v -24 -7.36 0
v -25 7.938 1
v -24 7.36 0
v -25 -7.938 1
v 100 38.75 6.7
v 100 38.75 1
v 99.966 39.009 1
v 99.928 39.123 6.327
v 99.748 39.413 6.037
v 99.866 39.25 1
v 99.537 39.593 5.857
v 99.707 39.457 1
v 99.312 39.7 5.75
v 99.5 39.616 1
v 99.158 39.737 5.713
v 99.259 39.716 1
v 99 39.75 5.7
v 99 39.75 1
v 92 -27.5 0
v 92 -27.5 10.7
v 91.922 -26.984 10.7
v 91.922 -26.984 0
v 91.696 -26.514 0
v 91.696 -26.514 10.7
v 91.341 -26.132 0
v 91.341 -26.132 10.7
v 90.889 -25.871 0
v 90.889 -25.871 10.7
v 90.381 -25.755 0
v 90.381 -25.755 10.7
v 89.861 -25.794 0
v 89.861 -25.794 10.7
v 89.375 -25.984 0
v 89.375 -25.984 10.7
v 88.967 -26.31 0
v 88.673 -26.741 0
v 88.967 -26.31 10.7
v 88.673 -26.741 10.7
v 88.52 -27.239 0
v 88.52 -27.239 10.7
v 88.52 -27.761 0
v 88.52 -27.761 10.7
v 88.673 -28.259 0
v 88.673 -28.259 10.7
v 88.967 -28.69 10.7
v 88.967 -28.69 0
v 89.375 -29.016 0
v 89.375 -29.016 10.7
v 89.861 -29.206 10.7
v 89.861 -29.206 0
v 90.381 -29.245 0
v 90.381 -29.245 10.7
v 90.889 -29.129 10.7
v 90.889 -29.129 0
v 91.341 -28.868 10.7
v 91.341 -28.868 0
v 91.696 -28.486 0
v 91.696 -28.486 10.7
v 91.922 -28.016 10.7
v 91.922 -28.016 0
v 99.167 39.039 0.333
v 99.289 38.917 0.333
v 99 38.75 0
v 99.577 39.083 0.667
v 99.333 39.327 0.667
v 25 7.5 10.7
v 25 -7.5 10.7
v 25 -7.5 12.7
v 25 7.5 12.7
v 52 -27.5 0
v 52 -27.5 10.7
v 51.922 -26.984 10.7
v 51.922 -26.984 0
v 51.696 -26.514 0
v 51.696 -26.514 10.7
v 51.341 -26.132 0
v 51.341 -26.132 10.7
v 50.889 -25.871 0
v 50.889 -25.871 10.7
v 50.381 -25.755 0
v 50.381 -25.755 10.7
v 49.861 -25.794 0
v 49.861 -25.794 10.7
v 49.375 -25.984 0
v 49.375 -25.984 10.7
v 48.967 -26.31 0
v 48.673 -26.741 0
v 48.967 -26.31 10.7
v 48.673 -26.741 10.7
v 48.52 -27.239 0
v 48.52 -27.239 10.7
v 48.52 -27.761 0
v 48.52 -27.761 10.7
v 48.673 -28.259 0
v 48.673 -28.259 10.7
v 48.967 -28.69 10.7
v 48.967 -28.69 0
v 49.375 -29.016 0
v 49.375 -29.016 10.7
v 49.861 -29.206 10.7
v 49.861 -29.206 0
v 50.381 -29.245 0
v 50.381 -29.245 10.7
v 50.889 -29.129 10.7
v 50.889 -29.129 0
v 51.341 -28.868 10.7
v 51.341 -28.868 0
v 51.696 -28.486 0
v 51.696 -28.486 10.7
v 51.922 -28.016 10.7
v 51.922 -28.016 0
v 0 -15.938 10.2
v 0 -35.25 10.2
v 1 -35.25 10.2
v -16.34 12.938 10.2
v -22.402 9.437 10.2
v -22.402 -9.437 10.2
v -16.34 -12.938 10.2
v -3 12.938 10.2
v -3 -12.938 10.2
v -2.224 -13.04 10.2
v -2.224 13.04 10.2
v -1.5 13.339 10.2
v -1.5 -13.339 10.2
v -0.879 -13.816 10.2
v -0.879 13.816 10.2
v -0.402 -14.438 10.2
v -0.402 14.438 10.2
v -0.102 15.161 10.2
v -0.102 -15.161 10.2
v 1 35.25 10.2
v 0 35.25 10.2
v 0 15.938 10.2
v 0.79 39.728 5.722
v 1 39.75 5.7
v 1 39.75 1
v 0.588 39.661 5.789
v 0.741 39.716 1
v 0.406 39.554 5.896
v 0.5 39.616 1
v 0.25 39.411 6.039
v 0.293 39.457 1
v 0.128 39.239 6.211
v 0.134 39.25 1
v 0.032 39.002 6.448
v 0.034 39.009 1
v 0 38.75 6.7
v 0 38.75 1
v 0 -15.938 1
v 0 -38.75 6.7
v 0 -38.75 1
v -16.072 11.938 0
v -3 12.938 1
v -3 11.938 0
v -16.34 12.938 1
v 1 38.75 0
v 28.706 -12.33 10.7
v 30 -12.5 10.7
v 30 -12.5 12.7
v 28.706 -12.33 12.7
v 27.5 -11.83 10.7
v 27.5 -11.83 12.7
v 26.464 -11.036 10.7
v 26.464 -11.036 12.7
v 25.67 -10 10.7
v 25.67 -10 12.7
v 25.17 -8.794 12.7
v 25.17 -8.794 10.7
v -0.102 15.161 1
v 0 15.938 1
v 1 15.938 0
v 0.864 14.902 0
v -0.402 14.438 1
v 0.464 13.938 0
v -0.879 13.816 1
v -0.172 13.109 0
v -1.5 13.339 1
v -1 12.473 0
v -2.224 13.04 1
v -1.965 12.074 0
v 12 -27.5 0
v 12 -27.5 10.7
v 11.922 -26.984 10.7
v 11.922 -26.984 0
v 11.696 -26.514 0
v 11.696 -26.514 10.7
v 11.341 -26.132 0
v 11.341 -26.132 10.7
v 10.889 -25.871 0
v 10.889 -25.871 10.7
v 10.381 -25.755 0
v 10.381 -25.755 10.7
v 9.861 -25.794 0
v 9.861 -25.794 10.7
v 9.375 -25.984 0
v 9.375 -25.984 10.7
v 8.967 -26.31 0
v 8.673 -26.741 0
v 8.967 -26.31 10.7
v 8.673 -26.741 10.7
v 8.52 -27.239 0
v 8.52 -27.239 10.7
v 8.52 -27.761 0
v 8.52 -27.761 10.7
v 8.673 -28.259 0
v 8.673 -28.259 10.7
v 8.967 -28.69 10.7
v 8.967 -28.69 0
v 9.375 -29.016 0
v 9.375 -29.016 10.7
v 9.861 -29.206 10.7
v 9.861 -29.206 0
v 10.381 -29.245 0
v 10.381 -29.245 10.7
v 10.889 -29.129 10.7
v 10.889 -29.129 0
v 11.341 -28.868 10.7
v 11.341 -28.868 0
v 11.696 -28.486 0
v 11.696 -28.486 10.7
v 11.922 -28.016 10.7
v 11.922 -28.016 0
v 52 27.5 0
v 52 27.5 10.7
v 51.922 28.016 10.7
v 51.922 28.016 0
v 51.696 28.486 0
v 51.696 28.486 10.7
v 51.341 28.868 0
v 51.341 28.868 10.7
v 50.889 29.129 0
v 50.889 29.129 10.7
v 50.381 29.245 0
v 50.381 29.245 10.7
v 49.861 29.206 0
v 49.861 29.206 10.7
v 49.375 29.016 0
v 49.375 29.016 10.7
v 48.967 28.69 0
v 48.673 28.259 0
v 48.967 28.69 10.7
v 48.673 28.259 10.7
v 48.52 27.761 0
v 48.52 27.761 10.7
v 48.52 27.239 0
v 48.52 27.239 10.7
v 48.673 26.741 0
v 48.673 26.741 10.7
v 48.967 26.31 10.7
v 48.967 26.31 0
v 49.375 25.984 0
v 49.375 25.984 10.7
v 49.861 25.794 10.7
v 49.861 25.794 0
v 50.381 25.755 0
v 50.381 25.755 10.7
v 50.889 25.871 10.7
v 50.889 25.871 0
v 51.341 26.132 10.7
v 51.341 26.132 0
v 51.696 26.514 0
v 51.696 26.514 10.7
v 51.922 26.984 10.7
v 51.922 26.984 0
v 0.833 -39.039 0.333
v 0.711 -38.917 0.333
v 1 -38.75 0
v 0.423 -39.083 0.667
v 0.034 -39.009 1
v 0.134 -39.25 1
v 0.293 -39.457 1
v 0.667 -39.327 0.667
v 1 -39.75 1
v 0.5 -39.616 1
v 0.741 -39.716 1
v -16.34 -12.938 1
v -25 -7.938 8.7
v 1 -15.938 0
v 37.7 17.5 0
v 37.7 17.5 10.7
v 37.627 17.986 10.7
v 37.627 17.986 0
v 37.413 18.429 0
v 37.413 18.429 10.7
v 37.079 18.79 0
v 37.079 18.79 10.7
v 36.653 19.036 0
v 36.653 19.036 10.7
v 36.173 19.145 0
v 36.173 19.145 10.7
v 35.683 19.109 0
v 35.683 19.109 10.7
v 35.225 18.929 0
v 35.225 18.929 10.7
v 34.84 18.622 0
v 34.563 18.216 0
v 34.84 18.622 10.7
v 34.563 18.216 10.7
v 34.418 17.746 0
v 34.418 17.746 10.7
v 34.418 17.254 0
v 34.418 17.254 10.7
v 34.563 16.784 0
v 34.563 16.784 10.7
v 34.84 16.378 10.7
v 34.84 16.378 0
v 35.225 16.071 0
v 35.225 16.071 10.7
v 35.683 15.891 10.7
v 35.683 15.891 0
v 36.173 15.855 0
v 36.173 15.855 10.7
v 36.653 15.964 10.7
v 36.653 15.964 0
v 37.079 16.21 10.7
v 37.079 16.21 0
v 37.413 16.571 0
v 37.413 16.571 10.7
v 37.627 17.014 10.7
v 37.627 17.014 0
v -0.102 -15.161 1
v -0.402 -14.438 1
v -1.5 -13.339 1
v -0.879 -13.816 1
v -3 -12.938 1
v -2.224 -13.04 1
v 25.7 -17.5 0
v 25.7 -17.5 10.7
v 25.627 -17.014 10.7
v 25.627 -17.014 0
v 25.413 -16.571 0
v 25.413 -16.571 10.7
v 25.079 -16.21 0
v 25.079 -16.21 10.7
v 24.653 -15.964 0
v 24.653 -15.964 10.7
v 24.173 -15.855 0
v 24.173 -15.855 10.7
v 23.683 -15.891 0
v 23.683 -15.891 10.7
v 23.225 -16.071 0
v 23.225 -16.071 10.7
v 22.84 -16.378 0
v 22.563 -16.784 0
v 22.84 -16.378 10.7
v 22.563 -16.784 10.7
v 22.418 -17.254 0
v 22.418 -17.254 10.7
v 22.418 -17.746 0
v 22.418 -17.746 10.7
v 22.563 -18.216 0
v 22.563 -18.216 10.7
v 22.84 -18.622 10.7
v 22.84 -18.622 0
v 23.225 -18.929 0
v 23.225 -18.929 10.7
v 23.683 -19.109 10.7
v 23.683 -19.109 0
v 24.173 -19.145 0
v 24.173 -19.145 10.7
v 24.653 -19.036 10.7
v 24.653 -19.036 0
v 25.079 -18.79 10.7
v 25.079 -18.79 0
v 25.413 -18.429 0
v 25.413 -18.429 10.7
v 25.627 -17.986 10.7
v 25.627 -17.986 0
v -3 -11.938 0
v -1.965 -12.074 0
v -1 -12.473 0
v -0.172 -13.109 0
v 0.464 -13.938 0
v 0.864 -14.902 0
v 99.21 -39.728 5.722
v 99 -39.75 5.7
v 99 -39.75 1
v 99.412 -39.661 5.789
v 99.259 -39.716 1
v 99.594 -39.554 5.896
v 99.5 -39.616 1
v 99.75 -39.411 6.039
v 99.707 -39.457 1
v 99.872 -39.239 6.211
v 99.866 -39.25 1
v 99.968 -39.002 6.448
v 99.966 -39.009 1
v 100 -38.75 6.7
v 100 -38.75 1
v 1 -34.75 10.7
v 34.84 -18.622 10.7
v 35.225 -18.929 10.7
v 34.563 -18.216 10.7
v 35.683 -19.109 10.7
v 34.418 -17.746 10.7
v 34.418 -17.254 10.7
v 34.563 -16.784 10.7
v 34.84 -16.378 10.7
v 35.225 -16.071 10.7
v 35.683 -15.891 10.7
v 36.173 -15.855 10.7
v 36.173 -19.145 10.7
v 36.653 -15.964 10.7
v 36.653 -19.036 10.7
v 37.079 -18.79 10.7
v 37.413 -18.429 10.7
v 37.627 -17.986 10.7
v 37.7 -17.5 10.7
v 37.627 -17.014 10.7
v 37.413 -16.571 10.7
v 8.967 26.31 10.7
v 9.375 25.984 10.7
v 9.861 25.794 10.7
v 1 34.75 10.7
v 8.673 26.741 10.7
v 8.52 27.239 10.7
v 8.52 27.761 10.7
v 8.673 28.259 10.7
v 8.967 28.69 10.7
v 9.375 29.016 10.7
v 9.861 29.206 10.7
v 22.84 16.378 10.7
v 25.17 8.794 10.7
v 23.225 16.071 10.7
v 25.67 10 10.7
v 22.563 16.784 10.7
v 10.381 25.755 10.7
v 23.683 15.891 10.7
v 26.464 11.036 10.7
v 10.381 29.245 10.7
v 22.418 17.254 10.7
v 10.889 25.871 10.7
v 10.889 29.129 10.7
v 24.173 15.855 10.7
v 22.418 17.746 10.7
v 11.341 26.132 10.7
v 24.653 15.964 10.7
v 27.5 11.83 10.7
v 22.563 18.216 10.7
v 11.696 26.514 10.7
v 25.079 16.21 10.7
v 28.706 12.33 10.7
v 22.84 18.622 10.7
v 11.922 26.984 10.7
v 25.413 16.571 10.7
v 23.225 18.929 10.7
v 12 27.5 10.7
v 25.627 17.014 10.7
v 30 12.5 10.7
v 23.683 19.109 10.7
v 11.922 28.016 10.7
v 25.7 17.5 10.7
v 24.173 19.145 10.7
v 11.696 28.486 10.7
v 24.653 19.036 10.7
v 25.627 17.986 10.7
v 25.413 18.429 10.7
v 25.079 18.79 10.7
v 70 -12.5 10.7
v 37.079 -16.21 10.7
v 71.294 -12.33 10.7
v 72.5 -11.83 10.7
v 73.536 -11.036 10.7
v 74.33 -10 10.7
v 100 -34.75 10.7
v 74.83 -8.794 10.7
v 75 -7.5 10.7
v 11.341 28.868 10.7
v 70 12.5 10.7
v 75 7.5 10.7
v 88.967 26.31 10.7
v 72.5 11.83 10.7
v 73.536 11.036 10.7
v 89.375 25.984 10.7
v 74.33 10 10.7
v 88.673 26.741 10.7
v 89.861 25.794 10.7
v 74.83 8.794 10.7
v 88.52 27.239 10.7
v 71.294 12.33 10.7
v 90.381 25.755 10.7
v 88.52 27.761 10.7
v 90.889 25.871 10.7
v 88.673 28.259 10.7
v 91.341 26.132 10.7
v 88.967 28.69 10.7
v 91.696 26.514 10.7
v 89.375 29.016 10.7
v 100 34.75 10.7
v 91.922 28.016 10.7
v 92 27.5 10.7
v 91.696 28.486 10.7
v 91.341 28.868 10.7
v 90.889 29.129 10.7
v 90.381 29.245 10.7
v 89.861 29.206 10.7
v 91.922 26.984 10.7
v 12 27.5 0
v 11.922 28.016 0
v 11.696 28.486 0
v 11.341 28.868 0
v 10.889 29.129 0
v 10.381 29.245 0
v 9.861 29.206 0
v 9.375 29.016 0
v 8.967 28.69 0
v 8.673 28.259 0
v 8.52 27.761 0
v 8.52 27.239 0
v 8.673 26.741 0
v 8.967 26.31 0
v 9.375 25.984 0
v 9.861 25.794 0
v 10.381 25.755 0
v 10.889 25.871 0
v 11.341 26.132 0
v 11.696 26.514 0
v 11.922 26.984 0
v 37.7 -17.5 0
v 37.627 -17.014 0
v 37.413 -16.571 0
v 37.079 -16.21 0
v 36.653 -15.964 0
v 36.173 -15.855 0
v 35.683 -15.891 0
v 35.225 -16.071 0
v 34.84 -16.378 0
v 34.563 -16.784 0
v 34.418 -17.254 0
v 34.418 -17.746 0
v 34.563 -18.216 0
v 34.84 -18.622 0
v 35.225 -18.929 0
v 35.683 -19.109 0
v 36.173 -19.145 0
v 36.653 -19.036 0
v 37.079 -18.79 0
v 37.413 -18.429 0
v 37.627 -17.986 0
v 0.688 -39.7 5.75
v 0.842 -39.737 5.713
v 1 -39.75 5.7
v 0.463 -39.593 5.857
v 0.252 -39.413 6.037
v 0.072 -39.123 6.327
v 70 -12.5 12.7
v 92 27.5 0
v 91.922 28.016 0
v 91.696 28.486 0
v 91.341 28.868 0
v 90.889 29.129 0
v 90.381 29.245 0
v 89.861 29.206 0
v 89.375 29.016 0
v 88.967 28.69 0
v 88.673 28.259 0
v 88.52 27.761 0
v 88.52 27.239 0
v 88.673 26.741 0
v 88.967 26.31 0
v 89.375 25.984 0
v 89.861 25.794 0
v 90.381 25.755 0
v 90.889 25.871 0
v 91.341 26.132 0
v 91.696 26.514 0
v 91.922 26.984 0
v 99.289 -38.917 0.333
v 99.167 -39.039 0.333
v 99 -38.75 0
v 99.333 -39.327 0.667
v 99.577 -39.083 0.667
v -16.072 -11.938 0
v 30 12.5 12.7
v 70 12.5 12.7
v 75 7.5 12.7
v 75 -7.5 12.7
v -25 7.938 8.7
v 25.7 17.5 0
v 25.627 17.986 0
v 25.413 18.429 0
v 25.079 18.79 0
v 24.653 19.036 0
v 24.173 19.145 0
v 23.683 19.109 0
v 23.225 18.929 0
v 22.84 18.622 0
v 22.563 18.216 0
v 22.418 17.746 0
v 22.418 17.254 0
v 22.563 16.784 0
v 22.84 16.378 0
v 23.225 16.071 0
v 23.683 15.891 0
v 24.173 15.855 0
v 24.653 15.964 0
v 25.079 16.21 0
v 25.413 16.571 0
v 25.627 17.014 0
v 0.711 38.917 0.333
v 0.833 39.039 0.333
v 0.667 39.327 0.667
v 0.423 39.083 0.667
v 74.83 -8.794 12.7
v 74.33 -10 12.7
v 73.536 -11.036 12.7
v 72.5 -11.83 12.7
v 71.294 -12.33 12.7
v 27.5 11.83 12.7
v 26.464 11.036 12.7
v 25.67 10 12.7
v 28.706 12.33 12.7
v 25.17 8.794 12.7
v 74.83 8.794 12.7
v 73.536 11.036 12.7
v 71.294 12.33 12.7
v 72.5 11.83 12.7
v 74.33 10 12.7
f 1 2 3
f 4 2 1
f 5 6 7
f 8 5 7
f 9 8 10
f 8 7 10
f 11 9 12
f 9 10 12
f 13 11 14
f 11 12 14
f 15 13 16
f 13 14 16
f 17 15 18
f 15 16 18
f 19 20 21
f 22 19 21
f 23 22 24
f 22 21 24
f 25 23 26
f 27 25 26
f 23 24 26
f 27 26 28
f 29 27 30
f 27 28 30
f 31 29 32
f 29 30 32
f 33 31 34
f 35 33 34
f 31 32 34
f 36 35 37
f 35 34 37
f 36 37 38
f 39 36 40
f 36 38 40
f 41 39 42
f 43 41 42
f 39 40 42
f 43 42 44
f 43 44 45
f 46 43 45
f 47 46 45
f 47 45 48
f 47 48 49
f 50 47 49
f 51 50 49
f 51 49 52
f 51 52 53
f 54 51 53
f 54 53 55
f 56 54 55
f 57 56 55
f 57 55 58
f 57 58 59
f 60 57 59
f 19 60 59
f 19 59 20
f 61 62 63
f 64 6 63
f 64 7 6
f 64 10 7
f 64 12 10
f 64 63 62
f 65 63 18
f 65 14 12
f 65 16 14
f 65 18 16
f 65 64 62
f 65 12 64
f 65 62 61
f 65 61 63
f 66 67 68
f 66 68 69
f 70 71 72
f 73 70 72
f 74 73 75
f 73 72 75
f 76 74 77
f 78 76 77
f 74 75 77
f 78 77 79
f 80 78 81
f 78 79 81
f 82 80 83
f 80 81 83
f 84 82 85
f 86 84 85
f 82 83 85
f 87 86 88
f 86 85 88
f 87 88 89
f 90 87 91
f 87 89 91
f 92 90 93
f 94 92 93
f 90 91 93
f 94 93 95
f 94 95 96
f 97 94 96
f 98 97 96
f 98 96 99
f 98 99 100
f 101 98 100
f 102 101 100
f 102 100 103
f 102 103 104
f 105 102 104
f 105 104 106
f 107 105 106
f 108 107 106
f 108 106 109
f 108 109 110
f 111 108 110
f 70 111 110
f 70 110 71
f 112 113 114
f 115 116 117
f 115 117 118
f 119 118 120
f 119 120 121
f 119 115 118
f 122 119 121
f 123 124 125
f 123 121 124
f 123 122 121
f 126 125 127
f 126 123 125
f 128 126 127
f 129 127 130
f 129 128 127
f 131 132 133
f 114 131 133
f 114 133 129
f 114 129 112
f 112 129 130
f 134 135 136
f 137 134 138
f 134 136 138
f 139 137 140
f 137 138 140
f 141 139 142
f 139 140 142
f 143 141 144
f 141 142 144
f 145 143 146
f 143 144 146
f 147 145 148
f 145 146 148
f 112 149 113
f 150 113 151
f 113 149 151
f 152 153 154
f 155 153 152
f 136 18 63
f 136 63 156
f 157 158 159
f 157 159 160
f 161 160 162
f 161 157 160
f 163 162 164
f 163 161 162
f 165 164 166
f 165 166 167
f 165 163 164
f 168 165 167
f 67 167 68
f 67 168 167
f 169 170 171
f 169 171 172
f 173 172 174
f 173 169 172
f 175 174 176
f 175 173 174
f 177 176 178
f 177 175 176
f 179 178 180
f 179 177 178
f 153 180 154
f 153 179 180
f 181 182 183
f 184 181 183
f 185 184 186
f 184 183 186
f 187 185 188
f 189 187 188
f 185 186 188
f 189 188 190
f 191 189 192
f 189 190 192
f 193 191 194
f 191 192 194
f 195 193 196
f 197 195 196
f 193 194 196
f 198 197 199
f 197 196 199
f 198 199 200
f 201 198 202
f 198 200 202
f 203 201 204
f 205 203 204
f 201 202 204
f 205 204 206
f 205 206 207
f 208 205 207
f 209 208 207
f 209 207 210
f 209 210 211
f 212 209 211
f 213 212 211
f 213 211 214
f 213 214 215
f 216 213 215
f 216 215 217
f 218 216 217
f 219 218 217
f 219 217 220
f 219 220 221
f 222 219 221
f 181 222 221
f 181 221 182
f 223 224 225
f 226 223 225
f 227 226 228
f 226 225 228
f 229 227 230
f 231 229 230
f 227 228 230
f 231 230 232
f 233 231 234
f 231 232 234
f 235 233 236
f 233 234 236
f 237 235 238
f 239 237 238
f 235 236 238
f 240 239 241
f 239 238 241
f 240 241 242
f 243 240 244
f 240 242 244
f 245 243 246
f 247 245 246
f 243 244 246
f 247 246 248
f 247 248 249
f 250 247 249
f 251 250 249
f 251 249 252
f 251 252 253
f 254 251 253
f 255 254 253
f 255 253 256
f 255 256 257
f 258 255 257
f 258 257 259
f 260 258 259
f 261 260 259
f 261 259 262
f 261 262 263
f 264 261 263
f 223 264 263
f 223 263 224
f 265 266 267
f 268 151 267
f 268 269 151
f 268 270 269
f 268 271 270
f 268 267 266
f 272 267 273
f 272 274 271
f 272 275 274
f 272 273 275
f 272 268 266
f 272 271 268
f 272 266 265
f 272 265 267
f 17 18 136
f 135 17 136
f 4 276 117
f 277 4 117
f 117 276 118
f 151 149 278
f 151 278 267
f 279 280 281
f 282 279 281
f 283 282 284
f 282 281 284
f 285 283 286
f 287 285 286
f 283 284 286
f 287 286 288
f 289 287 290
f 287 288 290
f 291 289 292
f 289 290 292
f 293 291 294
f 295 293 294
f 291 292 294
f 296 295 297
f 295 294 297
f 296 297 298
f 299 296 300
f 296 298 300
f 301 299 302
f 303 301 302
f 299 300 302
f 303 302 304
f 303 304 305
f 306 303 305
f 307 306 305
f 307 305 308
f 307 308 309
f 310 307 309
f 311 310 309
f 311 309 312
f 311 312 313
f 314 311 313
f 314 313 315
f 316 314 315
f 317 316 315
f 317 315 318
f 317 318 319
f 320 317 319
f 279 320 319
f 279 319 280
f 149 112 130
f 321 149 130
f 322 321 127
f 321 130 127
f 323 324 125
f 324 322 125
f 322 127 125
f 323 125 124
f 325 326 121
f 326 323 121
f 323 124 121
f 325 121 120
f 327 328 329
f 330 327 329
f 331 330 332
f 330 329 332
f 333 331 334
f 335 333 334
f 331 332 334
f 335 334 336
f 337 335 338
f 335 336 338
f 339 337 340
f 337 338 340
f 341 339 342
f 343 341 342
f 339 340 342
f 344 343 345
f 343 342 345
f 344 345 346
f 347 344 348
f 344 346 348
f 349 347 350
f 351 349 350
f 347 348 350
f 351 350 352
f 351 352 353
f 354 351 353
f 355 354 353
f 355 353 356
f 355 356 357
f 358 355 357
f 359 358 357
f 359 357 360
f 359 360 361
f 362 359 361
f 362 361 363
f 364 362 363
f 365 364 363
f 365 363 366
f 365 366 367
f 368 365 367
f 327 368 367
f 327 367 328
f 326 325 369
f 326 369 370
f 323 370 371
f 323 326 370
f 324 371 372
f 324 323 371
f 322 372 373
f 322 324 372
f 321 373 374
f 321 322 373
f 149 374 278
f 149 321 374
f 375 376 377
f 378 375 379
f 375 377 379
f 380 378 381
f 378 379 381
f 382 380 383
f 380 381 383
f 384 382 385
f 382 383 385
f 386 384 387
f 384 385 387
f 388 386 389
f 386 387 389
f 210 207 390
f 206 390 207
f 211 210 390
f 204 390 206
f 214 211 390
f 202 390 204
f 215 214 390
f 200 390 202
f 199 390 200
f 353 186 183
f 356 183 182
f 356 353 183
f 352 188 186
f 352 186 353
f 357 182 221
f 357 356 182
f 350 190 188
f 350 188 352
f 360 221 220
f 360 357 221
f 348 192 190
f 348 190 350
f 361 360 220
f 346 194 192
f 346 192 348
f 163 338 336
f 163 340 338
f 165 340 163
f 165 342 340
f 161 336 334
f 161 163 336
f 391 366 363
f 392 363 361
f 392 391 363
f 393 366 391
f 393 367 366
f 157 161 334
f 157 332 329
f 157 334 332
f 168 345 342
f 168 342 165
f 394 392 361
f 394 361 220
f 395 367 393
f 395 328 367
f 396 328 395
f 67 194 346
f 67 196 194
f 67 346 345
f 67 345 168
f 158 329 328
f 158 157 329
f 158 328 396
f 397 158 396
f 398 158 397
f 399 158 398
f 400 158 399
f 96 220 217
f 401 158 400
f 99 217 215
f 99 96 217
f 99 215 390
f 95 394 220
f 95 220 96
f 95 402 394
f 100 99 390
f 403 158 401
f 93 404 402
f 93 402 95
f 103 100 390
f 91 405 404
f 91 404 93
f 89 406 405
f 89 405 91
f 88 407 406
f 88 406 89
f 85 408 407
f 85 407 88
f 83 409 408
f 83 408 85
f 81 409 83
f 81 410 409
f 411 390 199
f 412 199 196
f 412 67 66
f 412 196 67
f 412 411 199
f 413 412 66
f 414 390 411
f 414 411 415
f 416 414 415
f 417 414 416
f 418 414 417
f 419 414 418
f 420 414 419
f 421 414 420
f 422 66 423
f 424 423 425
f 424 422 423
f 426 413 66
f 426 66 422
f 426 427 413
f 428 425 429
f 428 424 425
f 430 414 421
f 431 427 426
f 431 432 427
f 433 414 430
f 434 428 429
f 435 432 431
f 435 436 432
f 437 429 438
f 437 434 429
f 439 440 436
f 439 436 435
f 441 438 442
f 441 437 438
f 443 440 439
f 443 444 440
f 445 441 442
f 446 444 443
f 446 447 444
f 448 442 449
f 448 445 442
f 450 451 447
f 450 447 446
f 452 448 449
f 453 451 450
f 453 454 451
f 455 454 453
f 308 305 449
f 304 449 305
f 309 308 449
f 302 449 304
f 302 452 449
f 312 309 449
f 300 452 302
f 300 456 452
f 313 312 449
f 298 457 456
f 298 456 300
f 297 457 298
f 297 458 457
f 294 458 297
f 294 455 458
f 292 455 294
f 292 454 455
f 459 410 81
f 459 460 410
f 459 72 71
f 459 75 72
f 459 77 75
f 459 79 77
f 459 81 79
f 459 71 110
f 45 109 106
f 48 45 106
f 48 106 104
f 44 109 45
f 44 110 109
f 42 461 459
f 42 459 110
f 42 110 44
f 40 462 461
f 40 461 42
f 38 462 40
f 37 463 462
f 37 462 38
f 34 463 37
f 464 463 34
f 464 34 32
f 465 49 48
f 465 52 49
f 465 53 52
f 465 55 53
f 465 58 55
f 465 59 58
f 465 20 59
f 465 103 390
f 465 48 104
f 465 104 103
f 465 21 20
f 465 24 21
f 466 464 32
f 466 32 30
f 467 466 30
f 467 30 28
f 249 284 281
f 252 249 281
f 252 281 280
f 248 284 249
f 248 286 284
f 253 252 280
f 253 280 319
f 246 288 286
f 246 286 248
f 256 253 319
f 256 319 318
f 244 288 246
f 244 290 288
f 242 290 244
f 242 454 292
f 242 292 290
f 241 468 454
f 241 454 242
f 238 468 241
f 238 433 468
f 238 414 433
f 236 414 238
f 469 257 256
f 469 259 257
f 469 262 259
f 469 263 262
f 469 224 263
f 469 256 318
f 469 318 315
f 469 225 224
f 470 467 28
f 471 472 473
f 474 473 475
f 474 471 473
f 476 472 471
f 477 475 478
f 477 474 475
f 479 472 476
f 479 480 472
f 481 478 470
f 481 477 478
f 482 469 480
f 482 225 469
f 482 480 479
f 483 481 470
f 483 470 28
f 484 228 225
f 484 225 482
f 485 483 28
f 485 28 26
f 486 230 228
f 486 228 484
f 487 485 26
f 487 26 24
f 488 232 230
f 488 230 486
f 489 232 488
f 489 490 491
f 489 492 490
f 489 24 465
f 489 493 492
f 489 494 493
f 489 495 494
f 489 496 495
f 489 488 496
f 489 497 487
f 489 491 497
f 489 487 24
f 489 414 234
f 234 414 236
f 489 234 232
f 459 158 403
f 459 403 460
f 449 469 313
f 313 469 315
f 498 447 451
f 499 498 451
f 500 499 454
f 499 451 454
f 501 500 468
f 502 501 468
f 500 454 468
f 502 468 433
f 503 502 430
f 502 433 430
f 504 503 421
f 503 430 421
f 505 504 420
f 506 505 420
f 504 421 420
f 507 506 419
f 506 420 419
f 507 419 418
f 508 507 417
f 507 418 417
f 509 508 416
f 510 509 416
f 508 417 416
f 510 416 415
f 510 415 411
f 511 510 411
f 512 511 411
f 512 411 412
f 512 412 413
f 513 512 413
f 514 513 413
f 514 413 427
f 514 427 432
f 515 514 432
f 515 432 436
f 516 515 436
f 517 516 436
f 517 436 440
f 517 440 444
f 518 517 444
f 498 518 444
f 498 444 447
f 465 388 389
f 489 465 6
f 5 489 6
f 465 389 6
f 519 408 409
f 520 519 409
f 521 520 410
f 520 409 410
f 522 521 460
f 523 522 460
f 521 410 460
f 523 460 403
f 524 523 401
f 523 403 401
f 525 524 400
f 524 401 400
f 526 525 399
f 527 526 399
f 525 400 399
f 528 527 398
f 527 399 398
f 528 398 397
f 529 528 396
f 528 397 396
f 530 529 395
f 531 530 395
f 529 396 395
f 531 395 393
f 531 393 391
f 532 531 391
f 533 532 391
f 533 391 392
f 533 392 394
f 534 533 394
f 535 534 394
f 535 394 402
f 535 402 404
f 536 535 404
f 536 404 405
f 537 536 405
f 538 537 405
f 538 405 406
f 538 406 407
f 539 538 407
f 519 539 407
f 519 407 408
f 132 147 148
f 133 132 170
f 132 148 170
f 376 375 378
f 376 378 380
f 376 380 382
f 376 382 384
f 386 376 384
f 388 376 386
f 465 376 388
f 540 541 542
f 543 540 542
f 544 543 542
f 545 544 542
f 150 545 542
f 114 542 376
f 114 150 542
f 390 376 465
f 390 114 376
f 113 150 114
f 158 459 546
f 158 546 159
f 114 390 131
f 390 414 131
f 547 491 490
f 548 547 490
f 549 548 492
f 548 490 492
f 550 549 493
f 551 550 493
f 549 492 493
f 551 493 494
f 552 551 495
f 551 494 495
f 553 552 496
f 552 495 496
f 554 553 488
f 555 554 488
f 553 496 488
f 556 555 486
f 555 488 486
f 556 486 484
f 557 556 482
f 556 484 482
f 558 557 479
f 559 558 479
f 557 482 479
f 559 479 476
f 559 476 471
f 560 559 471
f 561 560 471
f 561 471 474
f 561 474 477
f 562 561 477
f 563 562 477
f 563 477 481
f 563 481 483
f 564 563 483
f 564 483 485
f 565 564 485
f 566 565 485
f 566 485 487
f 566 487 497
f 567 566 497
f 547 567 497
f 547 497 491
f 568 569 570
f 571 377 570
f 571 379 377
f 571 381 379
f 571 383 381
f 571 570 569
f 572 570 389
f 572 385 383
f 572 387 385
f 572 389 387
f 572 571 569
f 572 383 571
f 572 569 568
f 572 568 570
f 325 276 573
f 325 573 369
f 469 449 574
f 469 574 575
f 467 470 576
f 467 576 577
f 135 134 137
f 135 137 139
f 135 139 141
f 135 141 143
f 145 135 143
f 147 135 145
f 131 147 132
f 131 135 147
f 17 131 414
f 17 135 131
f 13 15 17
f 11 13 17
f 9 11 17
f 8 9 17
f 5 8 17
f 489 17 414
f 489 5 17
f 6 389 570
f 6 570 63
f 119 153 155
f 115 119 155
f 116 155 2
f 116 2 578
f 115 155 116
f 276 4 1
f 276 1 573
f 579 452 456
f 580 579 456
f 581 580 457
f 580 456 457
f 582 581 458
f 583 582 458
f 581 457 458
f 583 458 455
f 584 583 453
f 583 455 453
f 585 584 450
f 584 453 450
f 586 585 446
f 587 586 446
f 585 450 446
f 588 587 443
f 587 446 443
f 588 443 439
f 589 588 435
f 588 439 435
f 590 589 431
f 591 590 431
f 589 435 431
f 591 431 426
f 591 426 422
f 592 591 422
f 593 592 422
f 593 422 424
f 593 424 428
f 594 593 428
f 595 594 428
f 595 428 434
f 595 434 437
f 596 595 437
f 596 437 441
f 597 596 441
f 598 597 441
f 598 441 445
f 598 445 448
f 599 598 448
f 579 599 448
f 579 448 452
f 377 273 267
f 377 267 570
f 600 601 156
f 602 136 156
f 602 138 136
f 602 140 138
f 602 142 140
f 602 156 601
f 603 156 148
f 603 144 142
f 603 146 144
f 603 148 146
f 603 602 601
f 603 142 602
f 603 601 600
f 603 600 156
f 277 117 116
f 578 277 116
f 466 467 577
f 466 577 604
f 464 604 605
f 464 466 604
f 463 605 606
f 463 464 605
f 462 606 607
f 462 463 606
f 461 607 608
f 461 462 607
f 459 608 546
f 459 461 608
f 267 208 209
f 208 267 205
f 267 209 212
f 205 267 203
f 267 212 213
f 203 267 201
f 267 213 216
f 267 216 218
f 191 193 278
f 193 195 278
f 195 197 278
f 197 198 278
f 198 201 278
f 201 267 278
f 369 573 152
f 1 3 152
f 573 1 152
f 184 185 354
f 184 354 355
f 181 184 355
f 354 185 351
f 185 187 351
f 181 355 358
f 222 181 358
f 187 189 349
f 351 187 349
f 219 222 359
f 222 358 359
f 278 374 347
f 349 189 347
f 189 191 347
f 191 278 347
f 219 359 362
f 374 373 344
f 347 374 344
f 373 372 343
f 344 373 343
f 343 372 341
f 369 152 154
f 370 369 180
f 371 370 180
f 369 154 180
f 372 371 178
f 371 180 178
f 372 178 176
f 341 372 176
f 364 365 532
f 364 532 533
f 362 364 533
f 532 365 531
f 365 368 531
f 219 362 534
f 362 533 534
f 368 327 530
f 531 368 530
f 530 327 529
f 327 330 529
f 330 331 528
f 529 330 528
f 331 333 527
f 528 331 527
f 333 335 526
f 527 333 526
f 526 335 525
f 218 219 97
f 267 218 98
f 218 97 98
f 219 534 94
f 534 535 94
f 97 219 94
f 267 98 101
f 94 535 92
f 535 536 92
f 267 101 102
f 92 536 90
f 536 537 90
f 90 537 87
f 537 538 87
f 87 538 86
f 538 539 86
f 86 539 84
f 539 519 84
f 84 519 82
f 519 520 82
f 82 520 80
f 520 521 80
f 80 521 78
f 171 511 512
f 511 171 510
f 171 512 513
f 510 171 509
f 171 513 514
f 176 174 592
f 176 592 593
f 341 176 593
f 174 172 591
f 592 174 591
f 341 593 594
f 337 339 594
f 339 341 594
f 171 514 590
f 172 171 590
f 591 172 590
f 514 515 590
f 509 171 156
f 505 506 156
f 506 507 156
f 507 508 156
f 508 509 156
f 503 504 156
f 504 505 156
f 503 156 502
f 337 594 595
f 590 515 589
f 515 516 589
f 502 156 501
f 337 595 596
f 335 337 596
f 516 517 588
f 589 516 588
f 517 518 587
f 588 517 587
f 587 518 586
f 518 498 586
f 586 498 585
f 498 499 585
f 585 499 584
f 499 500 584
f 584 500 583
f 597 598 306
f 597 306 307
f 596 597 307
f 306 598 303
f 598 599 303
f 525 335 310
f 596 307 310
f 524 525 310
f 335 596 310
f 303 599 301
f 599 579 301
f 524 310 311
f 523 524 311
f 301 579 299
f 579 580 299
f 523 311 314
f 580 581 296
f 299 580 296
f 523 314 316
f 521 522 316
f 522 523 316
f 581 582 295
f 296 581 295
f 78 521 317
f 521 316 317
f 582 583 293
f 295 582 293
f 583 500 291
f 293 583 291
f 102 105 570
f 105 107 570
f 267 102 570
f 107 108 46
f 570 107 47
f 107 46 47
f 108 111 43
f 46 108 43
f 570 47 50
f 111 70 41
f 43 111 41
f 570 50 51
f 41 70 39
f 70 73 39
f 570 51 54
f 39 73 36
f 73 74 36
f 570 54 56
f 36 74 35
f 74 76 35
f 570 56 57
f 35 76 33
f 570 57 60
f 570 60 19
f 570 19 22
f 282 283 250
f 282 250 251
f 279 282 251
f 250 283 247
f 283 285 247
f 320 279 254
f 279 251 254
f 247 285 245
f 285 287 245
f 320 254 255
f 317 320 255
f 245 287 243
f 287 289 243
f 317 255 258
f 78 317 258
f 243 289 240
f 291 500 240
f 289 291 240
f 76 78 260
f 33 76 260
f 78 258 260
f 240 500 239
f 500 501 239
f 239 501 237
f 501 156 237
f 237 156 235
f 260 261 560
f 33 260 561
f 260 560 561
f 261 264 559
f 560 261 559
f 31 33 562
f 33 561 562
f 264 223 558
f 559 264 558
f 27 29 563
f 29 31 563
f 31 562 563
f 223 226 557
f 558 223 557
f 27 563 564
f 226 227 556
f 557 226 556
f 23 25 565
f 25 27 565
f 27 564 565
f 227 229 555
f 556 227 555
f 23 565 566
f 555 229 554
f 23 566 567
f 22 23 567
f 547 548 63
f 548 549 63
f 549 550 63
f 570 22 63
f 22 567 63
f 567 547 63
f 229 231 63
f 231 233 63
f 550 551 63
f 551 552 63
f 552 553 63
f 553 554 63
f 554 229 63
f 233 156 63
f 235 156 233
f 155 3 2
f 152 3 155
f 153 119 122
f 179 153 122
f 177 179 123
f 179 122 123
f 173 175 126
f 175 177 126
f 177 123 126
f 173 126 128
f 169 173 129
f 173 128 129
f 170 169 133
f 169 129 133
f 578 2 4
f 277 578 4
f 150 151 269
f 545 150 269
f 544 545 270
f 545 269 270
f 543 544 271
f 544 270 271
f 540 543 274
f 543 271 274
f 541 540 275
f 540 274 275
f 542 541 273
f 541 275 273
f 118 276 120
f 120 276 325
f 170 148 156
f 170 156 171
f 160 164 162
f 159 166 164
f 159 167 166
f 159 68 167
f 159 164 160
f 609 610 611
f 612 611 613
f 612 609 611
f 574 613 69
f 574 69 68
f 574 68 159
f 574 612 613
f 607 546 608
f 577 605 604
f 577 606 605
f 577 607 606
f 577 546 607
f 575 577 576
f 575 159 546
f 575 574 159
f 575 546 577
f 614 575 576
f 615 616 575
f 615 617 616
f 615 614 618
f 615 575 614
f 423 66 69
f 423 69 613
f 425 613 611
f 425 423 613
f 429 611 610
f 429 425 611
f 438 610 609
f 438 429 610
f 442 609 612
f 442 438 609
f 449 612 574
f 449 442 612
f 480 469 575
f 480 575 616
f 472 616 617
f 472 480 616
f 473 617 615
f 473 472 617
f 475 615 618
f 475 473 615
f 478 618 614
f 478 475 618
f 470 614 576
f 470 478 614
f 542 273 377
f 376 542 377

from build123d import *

# Parameters (mm, degrees)
BOSS_EXTRUDE1_DEPTH         = 12.7
CHAMFER1_SIZE               = 5
CHAMFER1_SIZE2              = 8.660254038
TAP_DRILL_FOR_M4X0_7_TAP1_D = 3.3
CUT_EXTRUDE2_START          = -2
CUT_EXTRUDE2_DEPTH          = 2
SKETCH6_W                   = 26
SKETCH6_H                   = 79.5
CUT_EXTRUDE1_DEPTH          = 0.5
FILLET1_R                   = 3
CHAMFER2_SIZE               = 1
CHAMFER3_SIZE               = 1.5
CHAMFER3_SIZE2              = 2.598076211
TAP_DRILL_FOR_M5X0_8_TAP1_D = 3.5
CHAMFER4_SIZE               = 5


# Some blends are built 0.0001 mm under size
with BuildPart() as part:
    # Sketch1 → Boss-Extrude1 (new body)
    with BuildSketch(Plane.XY):
        with BuildLine():
            Line((0, 38.75), (0, 12.9375))
            Line((0, 12.9375), (-25, 12.9375))
            Line((-25, 12.9375), (-25, -12.9375))
            Line((-25, -12.9375), (0, -12.9375))
            Line((0, -12.9375), (0, -38.75))
            ThreePointArc((0, -38.75), (0.292893219, -39.457106781), (1, -39.75))
            Line((1, -39.75), (99, -39.75))
            ThreePointArc((99, -39.75), (99.707106781, -39.457106781), (100, -38.75))
            Line((100, -38.75), (100, 38.75))
            ThreePointArc((100, 38.75), (99.707106781, 39.457106781), (99, 39.75))
            Line((99, 39.75), (1, 39.75))
            ThreePointArc((1, 39.75), (0.292893219, 39.457106781), (0, 38.75))
        make_face()
    extrude(amount=BOSS_EXTRUDE1_DEPTH)

    # Chamfer1
    chamfer1_edges = [part.edges().sort_by_distance(p)[0] for p in [
        (-25, -12.9375, 6.35),
        (-25, 12.9375, 6.35),
    ]]
    chamfer1_side = [part.faces().sort_by_distance(p)[0] for p in [
        (-25, 0, 6.35),
    ]]
    chamfer(chamfer1_edges, length=CHAMFER1_SIZE, length2=CHAMFER1_SIZE2, reference=chamfer1_side[0])

    # Tap Drill for M4x0.7 Tap1 (through all)
    with Locations(Plane(origin=(0, 0, 0), x_dir=(-1, 0, 0), z_dir=(0, 0, -1))):
        with Locations((-24.05, 17.5), (-24.05, -17.5), (-36.05, 17.5), (-36.05, -17.5)):
            Hole(TAP_DRILL_FOR_M4X0_7_TAP1_D / 2)

    # Sketch9 → Cut-Extrude2 (cut)
    with BuildSketch(Plane.XY.offset(12.7).offset(CUT_EXTRUDE2_START)):
        with BuildLine():
            Line((0, 12.9375), (-16.339745962, 12.9375))
            Line((-16.339745962, 12.9375), (-25, 7.9375))
            Line((-25, 7.9375), (-25, -7.9375))
            Line((-25, -7.9375), (-16.339745962, -12.9375))
            Line((-16.339745962, -12.9375), (0, -12.9375))
            Line((0, -12.9375), (0, -38.75))
            ThreePointArc((0, -38.75), (0.292893219, -39.457106781), (1, -39.75))
            Line((1, -39.75), (99, -39.75))
            ThreePointArc((99, -39.75), (99.707106781, -39.457106781), (100, -38.75))
            Line((100, -38.75), (100, 38.75))
            ThreePointArc((100, 38.75), (99.707106781, 39.457106781), (99, 39.75))
            Line((99, 39.75), (1, 39.75))
            ThreePointArc((1, 39.75), (0.292893219, 39.457106781), (0, 38.75))
            Line((0, 38.75), (0, 12.9375))
        make_face()
        with BuildLine():
            Line((70, -12.5), (30, -12.5))
            ThreePointArc((30, -12.5), (26.464466094, -11.035533906), (25, -7.5))
            Line((25, -7.5), (25, 7.5))
            ThreePointArc((25, 7.5), (26.464466094, 11.035533906), (30, 12.5))
            Line((30, 12.5), (70, 12.5))
            ThreePointArc((70, 12.5), (73.535533906, 11.035533906), (75, 7.5))
            Line((75, 7.5), (75, -7.5))
            ThreePointArc((75, -7.5), (73.535533906, -11.035533906), (70, -12.5))
        make_face(mode=Mode.SUBTRACT)
    extrude(amount=CUT_EXTRUDE2_DEPTH, mode=Mode.SUBTRACT)

    # Sketch6 → Cut-Extrude1 (cut)
    with BuildSketch(Plane.XY.offset(10.7)):
        with Locations((-12, 0)):
            Rectangle(SKETCH6_W, SKETCH6_H)
    extrude(amount=-CUT_EXTRUDE1_DEPTH, mode=Mode.SUBTRACT)

    # Fillet1
    fillet1_edges = [part.edges().sort_by_distance(p)[0] for p in [
        (0, 12.9375, 5.1),
        (0, -12.9375, 5.1),
    ]]
    fillet(fillet1_edges, radius=FILLET1_R)

    # Chamfer2
    chamfer2_edges = [part.edges().sort_by_distance(p)[0] for p in [
        (0, 27.34375, 0),
        (0.292893219, 39.457106781, 0),
        (50, 39.75, 0),
        (99.707106781, 39.457106781, 0),
        (100, 0, 0),
        (99.707106781, -39.457106781, 0),
        (50, -39.75, 0),
        (0.292893219, -39.457106781, 0),
        (0, -27.34375, 0),
        (-9.669872981, 12.9375, 0),
        (-0.878679656, -13.816179656, 0),
        (-0.878679656, 13.816179656, 0),
        (-25, 0, 0),
        (-9.669872981, -12.9375, 0),
        (-20.669872981, -10.4375, 0),
        (-20.669872981, 10.4375, 0),
    ]]
    chamfer(chamfer2_edges, length=CHAMFER2_SIZE - 0.0001)  # a hair under: the kernel refuses the full size

    # Chamfer3
    chamfer3_edges = [part.edges().sort_by_distance(p)[0] for p in [
        (-25, 0, 10.2),
    ]]
    chamfer3_side = [part.faces().sort_by_distance(p)[0] for p in [
        (-25, 0, 5.59995),
    ]]
    chamfer(chamfer3_edges, length=CHAMFER3_SIZE, length2=CHAMFER3_SIZE2, reference=chamfer3_side[0])

    # Tap Drill for M5x0.8 Tap1 (through all)
    with Locations(Plane(origin=(0, 0, 0), x_dir=(-1, 0, 0), z_dir=(0, 0, -1))):
        with Locations((-90.25, 27.5), (-50.25, 27.5), (-10.25, 27.5), (-10.25, -27.5), (-50.25, -27.5), (-90.25, -27.5)):
            Hole(TAP_DRILL_FOR_M5X0_8_TAP1_D / 2)

    # Chamfer4
    # the kernel refuses this chamfer: 5 mm, written as the material it takes off along each edge
    with BuildSketch(Plane(origin=(-11.85841494, -39.75, 10.7), x_dir=(0, -0.027495876610586317, -0.9996219169112968), z_dir=(1, 0, 0)), Plane(origin=(111.85841494, 39.75, 10.7), x_dir=(0, 0.027495876610586317, -0.9996219169112968), z_dir=(-1, 0, 0))) as chamfer4_piece_1:
        Polygon((CHAMFER4_SIZE * 0.999621916911, CHAMFER4_SIZE * 0.0274958766106), (-CHAMFER4_SIZE * 0.0274958766106, CHAMFER4_SIZE * 0.999621916911), (0, 0), align=None)
    extrude(amount=123.71682988, mode=Mode.SUBTRACT)


solid = part.part
